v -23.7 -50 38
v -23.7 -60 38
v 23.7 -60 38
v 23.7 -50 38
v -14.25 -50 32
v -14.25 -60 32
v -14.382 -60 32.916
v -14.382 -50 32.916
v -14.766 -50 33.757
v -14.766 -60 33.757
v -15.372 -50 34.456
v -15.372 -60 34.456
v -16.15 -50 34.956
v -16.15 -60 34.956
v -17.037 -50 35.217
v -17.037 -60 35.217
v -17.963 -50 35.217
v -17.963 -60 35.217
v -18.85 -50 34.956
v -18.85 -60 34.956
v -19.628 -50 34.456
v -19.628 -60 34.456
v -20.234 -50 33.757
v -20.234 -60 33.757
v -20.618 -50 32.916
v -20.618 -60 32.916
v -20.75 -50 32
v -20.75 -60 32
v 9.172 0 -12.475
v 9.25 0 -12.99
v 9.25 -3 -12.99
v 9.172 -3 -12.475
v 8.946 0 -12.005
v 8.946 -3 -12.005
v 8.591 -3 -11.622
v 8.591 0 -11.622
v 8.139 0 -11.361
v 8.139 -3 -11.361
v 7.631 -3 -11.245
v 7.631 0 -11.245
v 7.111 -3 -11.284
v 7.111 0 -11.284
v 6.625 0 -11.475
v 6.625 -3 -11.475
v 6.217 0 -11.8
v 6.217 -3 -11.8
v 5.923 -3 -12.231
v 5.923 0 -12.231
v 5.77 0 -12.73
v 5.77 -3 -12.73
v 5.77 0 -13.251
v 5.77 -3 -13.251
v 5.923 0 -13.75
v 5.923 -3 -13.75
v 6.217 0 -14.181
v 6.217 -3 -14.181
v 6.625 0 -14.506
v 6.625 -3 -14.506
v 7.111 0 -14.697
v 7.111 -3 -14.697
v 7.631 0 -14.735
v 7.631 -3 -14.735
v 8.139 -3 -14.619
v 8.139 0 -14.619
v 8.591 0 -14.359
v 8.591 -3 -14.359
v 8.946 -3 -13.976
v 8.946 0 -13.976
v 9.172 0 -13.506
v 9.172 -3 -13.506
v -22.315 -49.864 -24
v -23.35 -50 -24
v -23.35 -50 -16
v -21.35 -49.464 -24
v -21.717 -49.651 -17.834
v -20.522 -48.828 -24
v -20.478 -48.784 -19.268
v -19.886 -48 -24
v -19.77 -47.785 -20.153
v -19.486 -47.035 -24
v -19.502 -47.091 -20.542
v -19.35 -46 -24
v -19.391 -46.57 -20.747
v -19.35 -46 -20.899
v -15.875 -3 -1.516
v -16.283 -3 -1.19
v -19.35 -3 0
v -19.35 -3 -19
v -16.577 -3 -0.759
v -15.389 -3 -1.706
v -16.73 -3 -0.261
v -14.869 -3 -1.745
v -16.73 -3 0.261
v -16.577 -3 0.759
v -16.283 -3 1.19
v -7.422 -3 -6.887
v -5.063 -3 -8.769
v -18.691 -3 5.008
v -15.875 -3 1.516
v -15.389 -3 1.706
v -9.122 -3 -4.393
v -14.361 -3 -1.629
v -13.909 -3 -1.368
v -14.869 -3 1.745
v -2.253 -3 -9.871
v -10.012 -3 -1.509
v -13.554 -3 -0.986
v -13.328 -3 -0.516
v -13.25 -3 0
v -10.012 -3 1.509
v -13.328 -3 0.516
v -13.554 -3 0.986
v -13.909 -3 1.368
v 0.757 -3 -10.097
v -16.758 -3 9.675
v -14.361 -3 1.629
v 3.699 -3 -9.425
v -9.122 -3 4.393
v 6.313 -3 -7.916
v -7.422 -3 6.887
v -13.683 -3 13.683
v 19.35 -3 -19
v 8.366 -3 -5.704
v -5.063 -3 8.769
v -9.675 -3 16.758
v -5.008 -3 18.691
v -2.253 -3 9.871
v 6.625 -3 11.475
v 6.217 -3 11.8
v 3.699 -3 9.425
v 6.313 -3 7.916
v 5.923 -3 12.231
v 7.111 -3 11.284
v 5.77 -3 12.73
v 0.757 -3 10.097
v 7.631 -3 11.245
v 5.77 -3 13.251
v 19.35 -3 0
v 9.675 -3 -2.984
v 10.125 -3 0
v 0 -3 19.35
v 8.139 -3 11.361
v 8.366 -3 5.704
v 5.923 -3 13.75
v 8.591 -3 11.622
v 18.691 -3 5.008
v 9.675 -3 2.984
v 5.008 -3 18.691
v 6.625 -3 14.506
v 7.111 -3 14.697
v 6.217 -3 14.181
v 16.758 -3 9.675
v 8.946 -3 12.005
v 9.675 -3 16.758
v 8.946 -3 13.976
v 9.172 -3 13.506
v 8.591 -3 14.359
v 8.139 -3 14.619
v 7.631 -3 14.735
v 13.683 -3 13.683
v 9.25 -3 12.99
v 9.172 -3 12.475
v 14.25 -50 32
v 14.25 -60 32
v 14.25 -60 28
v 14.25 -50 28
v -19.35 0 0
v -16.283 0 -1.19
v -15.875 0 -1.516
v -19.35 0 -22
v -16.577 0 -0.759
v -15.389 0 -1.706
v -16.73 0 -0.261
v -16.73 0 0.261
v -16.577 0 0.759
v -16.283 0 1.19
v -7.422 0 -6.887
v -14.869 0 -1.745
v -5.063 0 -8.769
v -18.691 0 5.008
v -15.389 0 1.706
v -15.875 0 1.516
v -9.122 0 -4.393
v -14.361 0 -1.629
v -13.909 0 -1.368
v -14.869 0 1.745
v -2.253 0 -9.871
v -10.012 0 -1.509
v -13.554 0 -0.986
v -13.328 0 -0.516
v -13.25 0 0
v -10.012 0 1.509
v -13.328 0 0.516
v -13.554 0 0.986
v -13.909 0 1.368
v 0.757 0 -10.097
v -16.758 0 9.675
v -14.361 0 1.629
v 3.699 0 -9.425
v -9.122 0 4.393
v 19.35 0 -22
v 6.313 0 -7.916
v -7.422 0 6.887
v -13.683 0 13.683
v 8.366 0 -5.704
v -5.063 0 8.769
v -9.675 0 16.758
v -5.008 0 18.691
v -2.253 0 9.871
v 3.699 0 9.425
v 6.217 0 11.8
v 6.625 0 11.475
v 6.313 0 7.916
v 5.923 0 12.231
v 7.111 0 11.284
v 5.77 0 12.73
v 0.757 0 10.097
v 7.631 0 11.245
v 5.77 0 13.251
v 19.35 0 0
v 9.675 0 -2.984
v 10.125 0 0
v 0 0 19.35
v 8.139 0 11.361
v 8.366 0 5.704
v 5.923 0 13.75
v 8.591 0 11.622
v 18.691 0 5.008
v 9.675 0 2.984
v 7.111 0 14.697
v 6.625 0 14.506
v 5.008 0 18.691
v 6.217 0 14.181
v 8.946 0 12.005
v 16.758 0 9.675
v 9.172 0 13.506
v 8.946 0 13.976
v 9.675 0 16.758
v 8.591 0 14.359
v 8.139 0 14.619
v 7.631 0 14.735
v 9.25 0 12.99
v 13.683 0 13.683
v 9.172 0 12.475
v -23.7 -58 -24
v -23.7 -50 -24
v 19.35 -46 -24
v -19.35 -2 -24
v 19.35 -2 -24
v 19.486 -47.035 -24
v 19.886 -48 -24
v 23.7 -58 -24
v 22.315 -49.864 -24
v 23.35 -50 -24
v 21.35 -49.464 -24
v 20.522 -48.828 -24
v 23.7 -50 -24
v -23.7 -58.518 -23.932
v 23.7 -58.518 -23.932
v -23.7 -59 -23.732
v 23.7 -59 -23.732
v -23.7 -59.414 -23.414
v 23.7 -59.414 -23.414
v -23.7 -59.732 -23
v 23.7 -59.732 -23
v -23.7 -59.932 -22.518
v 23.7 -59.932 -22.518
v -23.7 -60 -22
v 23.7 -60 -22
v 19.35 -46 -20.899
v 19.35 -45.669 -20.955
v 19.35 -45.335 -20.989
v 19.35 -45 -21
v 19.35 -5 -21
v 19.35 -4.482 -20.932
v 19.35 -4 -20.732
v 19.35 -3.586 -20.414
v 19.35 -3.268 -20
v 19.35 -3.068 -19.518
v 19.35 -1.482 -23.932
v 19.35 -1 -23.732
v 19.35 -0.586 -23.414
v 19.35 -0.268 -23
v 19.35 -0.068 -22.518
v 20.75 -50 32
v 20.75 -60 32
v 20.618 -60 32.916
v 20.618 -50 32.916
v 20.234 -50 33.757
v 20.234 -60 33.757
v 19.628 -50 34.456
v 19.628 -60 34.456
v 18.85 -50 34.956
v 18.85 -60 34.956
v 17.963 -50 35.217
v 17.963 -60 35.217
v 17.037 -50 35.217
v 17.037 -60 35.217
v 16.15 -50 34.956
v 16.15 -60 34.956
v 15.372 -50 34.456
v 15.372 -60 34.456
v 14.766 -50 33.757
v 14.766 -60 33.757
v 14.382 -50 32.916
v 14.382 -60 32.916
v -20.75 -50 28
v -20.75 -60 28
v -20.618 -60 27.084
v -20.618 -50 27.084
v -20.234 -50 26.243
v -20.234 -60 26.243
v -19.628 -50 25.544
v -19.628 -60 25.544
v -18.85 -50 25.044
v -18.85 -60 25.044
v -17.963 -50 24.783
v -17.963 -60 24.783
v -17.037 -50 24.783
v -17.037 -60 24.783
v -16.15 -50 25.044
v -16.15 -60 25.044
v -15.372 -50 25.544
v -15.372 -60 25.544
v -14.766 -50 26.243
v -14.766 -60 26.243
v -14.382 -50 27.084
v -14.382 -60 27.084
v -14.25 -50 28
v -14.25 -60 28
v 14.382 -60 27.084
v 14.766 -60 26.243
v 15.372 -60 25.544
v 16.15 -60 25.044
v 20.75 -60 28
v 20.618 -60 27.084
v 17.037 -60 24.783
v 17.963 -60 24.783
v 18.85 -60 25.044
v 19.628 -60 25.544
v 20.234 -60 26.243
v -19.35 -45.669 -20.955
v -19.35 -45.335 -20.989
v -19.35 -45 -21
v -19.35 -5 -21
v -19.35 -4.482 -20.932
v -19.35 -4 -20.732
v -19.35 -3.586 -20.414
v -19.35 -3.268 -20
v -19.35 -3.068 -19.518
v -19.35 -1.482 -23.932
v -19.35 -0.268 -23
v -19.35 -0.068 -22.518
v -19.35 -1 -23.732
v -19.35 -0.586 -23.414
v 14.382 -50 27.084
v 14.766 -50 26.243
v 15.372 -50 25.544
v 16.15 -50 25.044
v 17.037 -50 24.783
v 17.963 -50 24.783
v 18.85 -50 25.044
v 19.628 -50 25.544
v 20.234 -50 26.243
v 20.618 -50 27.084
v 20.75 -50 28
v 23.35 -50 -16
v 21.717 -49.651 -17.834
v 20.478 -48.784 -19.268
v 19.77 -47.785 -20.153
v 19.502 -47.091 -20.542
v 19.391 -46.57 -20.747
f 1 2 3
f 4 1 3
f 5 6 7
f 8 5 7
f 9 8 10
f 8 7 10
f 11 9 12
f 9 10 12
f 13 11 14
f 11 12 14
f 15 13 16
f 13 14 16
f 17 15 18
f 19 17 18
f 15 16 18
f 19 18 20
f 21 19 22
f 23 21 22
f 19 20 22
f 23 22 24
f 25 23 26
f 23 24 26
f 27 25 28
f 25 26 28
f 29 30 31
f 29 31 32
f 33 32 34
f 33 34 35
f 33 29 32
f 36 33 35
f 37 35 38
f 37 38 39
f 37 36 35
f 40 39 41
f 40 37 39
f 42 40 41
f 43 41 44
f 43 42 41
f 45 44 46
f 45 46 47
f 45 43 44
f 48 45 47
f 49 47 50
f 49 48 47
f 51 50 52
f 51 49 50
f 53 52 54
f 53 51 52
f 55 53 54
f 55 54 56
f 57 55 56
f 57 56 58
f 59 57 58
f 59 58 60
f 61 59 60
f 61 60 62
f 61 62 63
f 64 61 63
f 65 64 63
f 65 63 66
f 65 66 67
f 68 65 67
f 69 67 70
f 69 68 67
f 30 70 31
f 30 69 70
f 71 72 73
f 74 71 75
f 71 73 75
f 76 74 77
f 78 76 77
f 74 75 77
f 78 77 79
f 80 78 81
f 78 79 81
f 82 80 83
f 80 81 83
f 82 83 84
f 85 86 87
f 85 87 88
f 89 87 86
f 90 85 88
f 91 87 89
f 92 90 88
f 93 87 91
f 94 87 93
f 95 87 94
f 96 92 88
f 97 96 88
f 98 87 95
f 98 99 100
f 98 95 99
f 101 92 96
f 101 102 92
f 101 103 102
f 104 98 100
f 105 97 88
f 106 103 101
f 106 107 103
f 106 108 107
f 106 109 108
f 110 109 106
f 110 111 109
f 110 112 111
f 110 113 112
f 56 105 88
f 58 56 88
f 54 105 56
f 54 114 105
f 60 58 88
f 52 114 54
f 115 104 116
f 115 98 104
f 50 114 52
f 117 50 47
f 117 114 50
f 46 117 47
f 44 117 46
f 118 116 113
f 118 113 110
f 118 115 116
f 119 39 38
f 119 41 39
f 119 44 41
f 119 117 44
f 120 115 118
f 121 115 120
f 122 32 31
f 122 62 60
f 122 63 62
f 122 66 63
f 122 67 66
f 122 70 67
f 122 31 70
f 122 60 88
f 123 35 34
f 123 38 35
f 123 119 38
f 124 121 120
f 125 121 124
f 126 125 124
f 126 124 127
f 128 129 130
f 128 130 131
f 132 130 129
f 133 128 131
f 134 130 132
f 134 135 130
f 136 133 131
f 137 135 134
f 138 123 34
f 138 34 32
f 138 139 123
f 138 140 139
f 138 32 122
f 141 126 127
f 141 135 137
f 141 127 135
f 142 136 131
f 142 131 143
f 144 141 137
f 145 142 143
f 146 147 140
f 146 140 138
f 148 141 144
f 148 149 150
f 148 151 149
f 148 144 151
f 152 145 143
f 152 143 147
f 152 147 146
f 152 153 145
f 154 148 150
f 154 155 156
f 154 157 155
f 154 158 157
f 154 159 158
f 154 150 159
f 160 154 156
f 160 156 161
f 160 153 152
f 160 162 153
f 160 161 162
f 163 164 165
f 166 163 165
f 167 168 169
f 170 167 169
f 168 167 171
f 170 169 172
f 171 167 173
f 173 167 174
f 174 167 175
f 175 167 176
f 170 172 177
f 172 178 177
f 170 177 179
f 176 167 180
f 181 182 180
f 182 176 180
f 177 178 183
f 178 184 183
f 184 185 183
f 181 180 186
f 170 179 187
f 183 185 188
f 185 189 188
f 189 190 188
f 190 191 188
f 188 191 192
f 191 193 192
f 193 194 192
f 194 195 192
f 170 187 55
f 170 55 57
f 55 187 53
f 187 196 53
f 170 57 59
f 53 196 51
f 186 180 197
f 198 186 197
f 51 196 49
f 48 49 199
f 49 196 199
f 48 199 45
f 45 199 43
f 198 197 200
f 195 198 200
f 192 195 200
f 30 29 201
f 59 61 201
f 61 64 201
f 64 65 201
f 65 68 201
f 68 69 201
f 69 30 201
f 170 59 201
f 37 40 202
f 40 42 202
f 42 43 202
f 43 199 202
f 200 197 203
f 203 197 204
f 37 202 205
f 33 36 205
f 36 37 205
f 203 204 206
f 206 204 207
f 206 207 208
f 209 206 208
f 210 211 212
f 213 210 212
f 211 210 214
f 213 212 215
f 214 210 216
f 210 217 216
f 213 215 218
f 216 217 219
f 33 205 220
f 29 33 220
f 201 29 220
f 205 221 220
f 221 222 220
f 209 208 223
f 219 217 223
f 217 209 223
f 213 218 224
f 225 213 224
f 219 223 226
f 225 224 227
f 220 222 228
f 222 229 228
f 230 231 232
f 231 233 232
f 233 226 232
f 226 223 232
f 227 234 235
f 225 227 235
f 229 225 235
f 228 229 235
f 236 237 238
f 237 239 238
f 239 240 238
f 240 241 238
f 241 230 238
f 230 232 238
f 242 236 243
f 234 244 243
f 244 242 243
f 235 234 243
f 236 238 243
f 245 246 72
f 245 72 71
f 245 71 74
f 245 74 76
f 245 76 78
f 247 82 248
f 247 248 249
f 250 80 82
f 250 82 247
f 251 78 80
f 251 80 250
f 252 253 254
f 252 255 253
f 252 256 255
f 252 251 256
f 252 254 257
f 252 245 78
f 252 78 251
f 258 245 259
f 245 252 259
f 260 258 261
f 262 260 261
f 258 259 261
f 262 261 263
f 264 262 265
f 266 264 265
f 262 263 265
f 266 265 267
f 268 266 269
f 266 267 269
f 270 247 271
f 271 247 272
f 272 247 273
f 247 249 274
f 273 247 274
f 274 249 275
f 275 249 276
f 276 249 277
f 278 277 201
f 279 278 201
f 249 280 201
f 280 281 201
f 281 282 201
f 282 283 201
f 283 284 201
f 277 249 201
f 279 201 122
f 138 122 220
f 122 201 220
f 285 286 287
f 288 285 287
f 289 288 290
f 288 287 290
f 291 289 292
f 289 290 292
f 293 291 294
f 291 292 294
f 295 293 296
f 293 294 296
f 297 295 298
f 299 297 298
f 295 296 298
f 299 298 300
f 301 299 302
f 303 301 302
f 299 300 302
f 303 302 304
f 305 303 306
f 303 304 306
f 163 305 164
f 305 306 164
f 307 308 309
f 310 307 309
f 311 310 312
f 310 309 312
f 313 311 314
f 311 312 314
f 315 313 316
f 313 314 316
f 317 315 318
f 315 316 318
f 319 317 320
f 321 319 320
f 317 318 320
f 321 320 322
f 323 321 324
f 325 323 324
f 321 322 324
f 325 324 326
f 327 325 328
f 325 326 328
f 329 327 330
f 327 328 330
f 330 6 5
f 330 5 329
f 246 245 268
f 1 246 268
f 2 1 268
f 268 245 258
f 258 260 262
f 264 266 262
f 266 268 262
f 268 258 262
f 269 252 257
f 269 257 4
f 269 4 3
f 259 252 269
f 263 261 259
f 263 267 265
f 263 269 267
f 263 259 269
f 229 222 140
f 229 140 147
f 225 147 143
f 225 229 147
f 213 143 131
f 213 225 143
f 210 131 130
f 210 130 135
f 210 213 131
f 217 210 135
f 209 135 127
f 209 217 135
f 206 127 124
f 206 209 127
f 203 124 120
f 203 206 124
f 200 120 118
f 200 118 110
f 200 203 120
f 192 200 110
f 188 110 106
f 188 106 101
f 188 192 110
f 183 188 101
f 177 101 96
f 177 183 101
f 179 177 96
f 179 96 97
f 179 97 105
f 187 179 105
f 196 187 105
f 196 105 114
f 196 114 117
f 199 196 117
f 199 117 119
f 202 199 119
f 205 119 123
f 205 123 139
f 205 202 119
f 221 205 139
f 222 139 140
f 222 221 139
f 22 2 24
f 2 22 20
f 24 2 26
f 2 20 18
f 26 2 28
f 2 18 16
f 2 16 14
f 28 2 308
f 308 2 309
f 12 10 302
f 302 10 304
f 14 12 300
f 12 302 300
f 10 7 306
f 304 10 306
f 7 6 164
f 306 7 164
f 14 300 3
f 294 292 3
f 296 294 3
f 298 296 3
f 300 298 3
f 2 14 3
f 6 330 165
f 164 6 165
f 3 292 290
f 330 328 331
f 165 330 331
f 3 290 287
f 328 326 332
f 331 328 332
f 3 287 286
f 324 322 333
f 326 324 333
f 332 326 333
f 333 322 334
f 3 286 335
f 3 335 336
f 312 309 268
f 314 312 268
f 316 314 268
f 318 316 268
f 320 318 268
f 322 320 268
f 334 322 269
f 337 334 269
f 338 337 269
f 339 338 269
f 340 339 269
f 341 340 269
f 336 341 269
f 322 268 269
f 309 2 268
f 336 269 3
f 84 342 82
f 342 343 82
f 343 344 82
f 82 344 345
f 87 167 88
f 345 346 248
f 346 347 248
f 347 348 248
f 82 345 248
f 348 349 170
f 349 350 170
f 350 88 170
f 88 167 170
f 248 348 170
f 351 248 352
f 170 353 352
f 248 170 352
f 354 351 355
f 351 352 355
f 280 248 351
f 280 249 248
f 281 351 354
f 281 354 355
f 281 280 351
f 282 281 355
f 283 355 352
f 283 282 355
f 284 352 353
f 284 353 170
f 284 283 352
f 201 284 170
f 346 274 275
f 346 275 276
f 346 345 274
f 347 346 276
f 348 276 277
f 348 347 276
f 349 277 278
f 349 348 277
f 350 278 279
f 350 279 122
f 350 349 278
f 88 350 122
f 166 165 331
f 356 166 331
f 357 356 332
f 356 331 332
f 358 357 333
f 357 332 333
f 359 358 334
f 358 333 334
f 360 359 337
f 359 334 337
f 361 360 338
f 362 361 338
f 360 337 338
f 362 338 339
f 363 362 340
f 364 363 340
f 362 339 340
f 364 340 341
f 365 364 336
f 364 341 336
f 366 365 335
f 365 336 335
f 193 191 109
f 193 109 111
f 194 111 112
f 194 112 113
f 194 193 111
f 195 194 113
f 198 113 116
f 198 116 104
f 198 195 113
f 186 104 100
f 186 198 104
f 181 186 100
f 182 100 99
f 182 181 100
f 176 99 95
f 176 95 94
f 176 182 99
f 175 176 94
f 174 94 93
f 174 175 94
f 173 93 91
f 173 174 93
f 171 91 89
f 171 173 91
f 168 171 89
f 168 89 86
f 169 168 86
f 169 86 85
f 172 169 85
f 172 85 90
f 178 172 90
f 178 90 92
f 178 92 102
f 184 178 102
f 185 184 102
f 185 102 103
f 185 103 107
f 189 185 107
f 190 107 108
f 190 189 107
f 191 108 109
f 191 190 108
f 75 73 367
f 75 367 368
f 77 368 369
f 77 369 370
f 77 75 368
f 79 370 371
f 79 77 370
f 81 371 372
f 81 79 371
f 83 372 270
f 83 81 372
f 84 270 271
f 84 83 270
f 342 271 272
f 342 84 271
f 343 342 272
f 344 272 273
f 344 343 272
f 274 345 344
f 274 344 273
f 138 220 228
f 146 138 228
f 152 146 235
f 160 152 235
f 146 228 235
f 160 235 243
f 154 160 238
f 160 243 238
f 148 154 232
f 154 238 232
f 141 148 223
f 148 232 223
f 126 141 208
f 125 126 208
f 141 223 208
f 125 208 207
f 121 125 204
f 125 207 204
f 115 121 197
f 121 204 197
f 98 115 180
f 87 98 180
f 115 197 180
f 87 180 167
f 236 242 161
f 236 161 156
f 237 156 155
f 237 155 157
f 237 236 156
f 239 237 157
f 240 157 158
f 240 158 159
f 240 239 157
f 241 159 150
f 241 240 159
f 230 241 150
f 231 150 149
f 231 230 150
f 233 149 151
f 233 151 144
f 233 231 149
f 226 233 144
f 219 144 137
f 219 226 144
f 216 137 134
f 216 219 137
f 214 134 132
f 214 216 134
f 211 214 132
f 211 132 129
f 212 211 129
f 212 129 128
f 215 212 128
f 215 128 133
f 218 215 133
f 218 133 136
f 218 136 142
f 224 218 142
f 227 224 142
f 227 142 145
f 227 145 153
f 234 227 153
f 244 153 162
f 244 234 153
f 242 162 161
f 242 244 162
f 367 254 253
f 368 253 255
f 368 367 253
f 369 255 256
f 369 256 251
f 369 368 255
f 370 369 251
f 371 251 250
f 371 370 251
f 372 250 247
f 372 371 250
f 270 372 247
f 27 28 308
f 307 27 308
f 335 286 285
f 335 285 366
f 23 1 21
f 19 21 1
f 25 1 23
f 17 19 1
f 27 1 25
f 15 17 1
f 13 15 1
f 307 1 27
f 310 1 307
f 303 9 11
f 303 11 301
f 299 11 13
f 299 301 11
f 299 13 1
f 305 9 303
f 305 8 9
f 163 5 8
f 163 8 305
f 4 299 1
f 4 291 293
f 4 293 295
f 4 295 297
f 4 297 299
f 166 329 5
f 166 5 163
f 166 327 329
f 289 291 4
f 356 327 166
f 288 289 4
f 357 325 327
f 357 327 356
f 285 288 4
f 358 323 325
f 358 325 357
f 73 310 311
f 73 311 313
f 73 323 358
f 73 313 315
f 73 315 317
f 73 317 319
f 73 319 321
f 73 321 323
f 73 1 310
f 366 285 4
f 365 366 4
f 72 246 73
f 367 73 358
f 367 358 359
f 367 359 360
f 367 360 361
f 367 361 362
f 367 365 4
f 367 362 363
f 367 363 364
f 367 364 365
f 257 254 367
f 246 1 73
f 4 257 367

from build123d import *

# Parameters (mm, degrees)
SKETCH_R     = 10.125
SKETCH_R_2   = 1.75
PAD_DEPTH    = 3
SKETCH001_W  = 38.7
SKETCH001_H  = 3
PAD001_DEPTH = 60
SKETCH002_W  = 47.4
SKETCH002_H  = 10
PAD002_DEPTH = 62
POCKET_DEPTH = 10
FILLET_R     = 2
FILLET001_R  = 5
FILLET002_R  = 2
FILLET003_R  = 4


with BuildPart() as part:
    # Sketch → Pad (new body)
    with BuildSketch(Plane.XZ):
        with BuildLine():
            ThreePointArc((19.35, -3e-06), (0, 19.35), (-19.35, -3e-06))
            Line((-19.35, -3e-06), (-19.35, -24.000003))
            Line((-19.35, -24.000003), (19.35, -24.000003))
            Line((19.35, -24.000003), (19.35, -3e-06))
        make_face()
        Circle(SKETCH_R, mode=Mode.SUBTRACT)
        with Locations((7.500003, 12.990379)):
            Circle(SKETCH_R_2, mode=Mode.SUBTRACT)
        with Locations((-15, 5e-06)):
            Circle(SKETCH_R_2, mode=Mode.SUBTRACT)
        with Locations((7.499994, -12.990384)):
            Circle(SKETCH_R_2, mode=Mode.SUBTRACT)
    extrude(amount=PAD_DEPTH)

    # Sketch001 (on Face9 of Pad) → Pad001 (join)
    with BuildSketch(Plane(origin=(0, 0, 0), x_dir=(1, 0, 0), z_dir=(0, 1, 0))):
        with Locations((0, 22.500003)):
            Rectangle(SKETCH001_W, SKETCH001_H)
    extrude(amount=-PAD001_DEPTH)

    # Sketch002 (on Face12 of Pad001) → Pad002 (join)
    with BuildSketch(Plane(origin=(0, 0, -24.000003), x_dir=(1, 0, 0), z_dir=(0, 0, -1))):
        with Locations((0, 55)):
            Rectangle(SKETCH002_W, SKETCH002_H)
    extrude(amount=-PAD002_DEPTH)

    # Sketch003 (on Face16 of Pad002) → Pocket (cut)
    with BuildSketch(Plane.XZ.offset(60)):
        with BuildLine():
            ThreePointArc((-14.25, 32), (-17.5, 35.25), (-20.75, 32))
            Line((-20.75, 32), (-20.75, 28))
            ThreePointArc((-20.75, 28), (-17.5, 24.75), (-14.25, 28))
            Line((-14.25, 32), (-14.25, 28))
        make_face()
        with BuildLine():
            ThreePointArc((20.75, 32), (17.5, 35.25), (14.25, 32))
            Line((14.25, 32), (14.25, 28))
            ThreePointArc((14.25, 28), (17.5, 24.75), (20.75, 28))
            Line((20.75, 32), (20.75, 28))
        make_face()
    extrude(amount=-POCKET_DEPTH, mode=Mode.SUBTRACT)

    # Fillet
    fillet_edges = [part.edges().sort_by_distance(p)[0] for p in [
        (0, 0, -24.000003),
        (0, -3, -21.000003),
    ]]
    fillet(fillet_edges, radius=FILLET_R)

    # Fillet001
    fillet001_edges = [part.edges().sort_by_distance(p)[0] for p in [
        (0, -50, -21.000003),
    ]]
    fillet(fillet001_edges, radius=FILLET001_R)

    # Fillet002
    fillet002_edges = [part.edges().sort_by_distance(p)[0] for p in [
        (0, -60, -24.000003),
    ]]
    fillet(fillet002_edges, radius=FILLET002_R)

    # Fillet003
    fillet003_edges = [part.edges().sort_by_distance(p)[0] for p in [
        (-19.35, -50, -22.500003),
        (-19.35, -50, -18.500003),
        (19.35, -50, -22.500003),
        (19.35, -50, -18.500003),
    ]]
    fillet(fillet003_edges, radius=FILLET003_R)


solid = part.part
